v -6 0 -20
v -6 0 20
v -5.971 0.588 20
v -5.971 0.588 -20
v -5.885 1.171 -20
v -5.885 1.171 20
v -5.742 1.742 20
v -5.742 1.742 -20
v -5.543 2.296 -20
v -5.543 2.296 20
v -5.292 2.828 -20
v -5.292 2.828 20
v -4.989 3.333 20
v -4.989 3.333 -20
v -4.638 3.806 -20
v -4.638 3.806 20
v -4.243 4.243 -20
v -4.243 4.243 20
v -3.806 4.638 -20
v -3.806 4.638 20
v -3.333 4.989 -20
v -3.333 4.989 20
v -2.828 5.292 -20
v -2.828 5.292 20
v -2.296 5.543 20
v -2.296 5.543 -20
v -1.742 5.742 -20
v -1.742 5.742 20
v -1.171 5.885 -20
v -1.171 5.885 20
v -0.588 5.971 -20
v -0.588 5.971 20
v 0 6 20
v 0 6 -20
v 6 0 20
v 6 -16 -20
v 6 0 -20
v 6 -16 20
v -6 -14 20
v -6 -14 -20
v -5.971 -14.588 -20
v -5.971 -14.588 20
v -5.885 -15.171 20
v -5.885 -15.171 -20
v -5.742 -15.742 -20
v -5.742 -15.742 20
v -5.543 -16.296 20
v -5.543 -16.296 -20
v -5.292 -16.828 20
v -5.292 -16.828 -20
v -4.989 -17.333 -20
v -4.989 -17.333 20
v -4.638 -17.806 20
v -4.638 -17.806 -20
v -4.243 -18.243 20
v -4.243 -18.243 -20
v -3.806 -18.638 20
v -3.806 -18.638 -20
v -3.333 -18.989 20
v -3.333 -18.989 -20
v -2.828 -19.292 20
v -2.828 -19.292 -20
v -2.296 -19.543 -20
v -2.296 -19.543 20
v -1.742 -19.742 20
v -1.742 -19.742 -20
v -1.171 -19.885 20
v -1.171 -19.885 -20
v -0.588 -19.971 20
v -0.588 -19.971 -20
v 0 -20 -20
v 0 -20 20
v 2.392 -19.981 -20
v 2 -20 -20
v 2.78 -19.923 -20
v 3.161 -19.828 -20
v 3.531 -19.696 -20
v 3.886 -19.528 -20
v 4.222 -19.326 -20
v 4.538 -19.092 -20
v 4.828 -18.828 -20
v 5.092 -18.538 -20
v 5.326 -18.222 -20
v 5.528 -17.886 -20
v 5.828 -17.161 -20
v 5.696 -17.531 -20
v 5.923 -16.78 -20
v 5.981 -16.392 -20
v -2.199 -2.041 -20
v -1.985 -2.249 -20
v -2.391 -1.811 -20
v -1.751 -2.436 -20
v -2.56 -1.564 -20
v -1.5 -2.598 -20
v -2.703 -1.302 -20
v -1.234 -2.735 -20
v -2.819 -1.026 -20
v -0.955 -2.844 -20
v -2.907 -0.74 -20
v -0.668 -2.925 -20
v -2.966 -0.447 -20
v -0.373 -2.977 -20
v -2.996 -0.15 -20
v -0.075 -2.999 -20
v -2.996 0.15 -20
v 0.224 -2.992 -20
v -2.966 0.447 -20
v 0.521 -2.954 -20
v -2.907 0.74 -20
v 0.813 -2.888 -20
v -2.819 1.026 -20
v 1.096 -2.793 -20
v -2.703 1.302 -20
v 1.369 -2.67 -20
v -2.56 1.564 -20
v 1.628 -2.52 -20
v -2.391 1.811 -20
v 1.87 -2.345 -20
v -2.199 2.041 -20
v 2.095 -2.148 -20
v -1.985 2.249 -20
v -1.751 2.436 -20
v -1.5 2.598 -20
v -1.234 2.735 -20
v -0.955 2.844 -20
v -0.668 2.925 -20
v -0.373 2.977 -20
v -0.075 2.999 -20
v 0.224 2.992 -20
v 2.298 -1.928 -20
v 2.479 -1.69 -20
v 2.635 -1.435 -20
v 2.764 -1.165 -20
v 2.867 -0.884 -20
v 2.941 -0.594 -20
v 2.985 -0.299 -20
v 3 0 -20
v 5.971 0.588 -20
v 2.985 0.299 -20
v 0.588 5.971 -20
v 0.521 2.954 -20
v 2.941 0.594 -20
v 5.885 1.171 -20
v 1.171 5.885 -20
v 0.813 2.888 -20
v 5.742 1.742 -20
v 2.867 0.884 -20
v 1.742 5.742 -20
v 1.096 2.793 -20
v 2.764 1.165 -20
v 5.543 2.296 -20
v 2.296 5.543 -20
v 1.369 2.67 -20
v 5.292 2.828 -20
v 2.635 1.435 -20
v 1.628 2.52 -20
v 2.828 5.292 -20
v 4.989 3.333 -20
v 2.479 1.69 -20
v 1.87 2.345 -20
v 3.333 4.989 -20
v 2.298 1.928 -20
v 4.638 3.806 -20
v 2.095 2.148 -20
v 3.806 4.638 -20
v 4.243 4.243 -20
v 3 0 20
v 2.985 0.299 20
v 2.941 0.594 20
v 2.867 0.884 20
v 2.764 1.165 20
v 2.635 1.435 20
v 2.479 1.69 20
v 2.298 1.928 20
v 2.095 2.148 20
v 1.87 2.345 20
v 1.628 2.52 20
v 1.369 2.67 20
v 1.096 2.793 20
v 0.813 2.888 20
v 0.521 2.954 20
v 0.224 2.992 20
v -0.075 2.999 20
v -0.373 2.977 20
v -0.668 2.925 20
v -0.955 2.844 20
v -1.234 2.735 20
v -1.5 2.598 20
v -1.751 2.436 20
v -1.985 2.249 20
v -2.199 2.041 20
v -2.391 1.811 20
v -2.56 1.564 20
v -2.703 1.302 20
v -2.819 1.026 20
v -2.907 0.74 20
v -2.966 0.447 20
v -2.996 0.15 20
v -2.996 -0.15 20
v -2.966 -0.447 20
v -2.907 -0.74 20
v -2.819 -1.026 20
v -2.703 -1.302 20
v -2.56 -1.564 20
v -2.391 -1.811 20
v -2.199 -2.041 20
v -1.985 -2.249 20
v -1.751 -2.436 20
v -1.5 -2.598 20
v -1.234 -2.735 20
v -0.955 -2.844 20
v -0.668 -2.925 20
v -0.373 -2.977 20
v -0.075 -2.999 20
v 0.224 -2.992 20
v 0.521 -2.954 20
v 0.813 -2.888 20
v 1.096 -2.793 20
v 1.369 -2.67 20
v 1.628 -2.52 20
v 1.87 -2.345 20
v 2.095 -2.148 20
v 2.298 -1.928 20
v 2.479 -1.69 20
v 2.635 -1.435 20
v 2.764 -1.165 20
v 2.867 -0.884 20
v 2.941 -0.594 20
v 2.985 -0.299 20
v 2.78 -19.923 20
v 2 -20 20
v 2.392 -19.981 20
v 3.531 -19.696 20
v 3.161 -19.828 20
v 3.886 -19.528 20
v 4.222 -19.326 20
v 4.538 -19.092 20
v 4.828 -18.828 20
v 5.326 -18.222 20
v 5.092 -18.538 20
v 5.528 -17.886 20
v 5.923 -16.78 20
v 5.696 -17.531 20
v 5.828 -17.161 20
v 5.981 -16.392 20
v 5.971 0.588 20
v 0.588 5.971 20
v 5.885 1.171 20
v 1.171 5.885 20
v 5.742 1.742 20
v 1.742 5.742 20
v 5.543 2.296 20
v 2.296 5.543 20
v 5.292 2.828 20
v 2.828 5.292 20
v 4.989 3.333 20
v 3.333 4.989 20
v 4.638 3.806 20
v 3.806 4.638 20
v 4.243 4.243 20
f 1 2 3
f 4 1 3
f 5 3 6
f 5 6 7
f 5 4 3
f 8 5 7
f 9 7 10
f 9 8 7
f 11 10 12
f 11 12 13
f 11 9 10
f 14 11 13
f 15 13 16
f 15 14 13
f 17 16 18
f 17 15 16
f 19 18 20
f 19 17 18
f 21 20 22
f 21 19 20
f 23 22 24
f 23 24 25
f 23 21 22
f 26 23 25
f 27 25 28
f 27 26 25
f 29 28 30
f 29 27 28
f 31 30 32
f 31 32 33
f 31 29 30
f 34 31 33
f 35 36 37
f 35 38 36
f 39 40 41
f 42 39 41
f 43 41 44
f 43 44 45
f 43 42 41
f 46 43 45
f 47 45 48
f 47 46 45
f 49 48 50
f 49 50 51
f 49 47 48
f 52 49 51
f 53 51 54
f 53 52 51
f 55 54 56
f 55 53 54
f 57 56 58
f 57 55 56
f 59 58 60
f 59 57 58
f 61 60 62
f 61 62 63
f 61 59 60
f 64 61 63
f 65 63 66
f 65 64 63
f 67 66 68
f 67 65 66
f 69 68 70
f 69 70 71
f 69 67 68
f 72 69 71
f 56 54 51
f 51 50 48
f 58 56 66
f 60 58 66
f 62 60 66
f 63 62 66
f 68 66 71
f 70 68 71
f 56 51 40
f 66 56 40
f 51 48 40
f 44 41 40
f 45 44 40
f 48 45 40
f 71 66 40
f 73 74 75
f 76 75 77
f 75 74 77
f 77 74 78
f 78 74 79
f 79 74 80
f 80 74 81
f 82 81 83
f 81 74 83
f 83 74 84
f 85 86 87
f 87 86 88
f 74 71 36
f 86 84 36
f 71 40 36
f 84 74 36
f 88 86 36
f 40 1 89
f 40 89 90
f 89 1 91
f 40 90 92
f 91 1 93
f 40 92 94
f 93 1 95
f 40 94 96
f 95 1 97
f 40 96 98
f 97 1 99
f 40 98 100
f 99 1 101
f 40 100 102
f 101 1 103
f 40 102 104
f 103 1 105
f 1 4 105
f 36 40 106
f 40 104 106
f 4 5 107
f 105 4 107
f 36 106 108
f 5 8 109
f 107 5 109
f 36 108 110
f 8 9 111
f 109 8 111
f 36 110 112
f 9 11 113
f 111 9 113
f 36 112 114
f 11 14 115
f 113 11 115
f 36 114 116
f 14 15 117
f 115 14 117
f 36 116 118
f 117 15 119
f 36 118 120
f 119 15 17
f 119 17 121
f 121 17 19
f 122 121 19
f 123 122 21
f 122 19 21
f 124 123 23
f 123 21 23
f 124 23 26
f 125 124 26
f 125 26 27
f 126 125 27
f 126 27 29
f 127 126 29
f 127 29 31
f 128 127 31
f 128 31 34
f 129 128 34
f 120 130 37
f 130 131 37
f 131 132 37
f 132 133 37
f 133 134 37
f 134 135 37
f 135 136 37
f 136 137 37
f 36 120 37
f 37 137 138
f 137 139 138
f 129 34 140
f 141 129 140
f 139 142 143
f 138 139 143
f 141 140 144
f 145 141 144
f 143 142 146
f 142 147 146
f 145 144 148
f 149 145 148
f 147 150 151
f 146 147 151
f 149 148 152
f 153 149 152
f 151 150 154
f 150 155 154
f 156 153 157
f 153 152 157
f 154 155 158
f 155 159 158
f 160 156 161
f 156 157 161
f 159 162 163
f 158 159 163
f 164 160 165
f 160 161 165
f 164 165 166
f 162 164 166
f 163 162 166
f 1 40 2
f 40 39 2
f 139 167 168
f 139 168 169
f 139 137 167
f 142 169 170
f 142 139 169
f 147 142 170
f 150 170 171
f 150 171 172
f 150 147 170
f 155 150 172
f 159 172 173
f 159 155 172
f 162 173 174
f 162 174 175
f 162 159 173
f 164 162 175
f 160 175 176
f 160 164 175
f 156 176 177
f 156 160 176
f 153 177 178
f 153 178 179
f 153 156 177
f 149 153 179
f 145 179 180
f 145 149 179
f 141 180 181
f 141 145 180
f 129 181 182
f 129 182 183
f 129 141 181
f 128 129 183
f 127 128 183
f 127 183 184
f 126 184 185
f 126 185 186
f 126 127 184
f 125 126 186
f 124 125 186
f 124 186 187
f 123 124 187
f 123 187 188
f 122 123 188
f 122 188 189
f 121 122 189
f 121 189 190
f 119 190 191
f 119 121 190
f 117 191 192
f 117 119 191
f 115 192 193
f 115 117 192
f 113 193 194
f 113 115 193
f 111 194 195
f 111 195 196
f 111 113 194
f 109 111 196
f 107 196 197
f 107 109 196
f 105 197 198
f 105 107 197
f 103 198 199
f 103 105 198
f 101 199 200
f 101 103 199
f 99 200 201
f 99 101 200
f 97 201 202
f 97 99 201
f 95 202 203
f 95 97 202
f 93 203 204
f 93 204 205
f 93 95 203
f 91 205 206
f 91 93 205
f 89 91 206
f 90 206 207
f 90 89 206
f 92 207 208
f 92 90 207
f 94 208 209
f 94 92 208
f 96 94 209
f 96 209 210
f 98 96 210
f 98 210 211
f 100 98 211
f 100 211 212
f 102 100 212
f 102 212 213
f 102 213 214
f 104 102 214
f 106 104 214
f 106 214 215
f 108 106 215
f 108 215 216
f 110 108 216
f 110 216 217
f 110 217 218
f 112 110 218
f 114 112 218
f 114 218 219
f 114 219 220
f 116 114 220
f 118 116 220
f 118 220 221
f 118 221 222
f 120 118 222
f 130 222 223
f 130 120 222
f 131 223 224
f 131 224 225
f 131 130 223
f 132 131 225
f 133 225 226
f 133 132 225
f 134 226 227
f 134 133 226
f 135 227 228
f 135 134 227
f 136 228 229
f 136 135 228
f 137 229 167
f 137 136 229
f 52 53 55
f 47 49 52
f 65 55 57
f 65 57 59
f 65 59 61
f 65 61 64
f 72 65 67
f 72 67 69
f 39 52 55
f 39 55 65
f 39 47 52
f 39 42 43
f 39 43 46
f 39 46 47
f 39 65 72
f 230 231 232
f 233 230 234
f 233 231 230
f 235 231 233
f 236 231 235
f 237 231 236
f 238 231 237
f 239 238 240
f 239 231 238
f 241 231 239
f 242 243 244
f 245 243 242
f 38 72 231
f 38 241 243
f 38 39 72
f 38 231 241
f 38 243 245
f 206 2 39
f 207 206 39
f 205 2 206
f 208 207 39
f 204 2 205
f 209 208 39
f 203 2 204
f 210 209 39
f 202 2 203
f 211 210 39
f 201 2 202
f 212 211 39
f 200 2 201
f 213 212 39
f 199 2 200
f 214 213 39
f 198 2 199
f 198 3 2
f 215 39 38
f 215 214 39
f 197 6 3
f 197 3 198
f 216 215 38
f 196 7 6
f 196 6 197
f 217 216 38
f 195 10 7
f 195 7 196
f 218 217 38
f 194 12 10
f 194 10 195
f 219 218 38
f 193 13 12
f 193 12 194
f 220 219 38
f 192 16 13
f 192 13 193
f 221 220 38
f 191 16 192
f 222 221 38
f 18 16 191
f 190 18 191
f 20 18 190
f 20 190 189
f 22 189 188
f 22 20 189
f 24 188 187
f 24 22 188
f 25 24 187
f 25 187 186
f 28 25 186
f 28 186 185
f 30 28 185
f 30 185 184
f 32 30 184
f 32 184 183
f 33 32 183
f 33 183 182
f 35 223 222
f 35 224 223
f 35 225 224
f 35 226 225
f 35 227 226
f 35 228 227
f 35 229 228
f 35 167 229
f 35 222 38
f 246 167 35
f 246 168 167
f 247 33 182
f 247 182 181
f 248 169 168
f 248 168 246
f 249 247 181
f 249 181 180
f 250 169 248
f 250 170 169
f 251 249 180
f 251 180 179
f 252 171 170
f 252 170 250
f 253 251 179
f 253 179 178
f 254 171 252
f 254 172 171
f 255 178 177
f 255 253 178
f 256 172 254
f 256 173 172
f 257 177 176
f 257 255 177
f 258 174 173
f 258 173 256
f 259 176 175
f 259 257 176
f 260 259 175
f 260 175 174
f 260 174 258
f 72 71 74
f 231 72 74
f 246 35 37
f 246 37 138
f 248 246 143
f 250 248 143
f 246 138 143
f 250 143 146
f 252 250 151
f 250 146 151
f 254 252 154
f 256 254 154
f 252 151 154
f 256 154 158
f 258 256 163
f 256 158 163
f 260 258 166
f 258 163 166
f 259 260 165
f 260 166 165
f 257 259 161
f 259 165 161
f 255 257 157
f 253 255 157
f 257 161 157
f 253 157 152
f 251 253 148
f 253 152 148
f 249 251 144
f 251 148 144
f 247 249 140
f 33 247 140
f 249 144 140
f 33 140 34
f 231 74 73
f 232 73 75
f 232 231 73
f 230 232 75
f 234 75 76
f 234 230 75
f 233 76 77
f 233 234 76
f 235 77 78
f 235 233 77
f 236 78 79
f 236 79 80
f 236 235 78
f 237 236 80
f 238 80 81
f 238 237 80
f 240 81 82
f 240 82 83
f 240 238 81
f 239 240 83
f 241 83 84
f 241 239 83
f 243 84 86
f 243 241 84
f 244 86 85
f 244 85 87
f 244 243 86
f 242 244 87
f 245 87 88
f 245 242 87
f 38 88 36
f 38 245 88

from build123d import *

# Parameters (mm, degrees)
SKETCH1_W           = 12
SKETCH1_H           = 26
SKETCH1_R           = 3
BOSS_EXTRUDE1_DEPTH = 20
FILLET1_R           = 6
FILLET2_R           = 4


with BuildPart() as part:
    # Sketch1 → Boss-Extrude1 (new, symmetric)
    with BuildSketch(Plane.XY):
        with Locations((0, -7)):
            Rectangle(SKETCH1_W, SKETCH1_H)
        Circle(SKETCH1_R, mode=Mode.SUBTRACT)
    extrude(amount=BOSS_EXTRUDE1_DEPTH, both=True)

    # Fillet1
    fillet1_edges = [part.edges().sort_by_distance(p)[0] for p in [
        (-6, -20, 0),
        (6, 6, 0),
        (-6, 6, 0),
    ]]
    fillet(fillet1_edges, radius=FILLET1_R - 0.0001)  # a hair under: the kernel refuses the full size

    # Fillet2
    fillet2_edges = [part.edges().sort_by_distance(p)[0] for p in [
        (6, -20, 0),
    ]]
    fillet(fillet2_edges, radius=FILLET2_R)


solid = part.part
